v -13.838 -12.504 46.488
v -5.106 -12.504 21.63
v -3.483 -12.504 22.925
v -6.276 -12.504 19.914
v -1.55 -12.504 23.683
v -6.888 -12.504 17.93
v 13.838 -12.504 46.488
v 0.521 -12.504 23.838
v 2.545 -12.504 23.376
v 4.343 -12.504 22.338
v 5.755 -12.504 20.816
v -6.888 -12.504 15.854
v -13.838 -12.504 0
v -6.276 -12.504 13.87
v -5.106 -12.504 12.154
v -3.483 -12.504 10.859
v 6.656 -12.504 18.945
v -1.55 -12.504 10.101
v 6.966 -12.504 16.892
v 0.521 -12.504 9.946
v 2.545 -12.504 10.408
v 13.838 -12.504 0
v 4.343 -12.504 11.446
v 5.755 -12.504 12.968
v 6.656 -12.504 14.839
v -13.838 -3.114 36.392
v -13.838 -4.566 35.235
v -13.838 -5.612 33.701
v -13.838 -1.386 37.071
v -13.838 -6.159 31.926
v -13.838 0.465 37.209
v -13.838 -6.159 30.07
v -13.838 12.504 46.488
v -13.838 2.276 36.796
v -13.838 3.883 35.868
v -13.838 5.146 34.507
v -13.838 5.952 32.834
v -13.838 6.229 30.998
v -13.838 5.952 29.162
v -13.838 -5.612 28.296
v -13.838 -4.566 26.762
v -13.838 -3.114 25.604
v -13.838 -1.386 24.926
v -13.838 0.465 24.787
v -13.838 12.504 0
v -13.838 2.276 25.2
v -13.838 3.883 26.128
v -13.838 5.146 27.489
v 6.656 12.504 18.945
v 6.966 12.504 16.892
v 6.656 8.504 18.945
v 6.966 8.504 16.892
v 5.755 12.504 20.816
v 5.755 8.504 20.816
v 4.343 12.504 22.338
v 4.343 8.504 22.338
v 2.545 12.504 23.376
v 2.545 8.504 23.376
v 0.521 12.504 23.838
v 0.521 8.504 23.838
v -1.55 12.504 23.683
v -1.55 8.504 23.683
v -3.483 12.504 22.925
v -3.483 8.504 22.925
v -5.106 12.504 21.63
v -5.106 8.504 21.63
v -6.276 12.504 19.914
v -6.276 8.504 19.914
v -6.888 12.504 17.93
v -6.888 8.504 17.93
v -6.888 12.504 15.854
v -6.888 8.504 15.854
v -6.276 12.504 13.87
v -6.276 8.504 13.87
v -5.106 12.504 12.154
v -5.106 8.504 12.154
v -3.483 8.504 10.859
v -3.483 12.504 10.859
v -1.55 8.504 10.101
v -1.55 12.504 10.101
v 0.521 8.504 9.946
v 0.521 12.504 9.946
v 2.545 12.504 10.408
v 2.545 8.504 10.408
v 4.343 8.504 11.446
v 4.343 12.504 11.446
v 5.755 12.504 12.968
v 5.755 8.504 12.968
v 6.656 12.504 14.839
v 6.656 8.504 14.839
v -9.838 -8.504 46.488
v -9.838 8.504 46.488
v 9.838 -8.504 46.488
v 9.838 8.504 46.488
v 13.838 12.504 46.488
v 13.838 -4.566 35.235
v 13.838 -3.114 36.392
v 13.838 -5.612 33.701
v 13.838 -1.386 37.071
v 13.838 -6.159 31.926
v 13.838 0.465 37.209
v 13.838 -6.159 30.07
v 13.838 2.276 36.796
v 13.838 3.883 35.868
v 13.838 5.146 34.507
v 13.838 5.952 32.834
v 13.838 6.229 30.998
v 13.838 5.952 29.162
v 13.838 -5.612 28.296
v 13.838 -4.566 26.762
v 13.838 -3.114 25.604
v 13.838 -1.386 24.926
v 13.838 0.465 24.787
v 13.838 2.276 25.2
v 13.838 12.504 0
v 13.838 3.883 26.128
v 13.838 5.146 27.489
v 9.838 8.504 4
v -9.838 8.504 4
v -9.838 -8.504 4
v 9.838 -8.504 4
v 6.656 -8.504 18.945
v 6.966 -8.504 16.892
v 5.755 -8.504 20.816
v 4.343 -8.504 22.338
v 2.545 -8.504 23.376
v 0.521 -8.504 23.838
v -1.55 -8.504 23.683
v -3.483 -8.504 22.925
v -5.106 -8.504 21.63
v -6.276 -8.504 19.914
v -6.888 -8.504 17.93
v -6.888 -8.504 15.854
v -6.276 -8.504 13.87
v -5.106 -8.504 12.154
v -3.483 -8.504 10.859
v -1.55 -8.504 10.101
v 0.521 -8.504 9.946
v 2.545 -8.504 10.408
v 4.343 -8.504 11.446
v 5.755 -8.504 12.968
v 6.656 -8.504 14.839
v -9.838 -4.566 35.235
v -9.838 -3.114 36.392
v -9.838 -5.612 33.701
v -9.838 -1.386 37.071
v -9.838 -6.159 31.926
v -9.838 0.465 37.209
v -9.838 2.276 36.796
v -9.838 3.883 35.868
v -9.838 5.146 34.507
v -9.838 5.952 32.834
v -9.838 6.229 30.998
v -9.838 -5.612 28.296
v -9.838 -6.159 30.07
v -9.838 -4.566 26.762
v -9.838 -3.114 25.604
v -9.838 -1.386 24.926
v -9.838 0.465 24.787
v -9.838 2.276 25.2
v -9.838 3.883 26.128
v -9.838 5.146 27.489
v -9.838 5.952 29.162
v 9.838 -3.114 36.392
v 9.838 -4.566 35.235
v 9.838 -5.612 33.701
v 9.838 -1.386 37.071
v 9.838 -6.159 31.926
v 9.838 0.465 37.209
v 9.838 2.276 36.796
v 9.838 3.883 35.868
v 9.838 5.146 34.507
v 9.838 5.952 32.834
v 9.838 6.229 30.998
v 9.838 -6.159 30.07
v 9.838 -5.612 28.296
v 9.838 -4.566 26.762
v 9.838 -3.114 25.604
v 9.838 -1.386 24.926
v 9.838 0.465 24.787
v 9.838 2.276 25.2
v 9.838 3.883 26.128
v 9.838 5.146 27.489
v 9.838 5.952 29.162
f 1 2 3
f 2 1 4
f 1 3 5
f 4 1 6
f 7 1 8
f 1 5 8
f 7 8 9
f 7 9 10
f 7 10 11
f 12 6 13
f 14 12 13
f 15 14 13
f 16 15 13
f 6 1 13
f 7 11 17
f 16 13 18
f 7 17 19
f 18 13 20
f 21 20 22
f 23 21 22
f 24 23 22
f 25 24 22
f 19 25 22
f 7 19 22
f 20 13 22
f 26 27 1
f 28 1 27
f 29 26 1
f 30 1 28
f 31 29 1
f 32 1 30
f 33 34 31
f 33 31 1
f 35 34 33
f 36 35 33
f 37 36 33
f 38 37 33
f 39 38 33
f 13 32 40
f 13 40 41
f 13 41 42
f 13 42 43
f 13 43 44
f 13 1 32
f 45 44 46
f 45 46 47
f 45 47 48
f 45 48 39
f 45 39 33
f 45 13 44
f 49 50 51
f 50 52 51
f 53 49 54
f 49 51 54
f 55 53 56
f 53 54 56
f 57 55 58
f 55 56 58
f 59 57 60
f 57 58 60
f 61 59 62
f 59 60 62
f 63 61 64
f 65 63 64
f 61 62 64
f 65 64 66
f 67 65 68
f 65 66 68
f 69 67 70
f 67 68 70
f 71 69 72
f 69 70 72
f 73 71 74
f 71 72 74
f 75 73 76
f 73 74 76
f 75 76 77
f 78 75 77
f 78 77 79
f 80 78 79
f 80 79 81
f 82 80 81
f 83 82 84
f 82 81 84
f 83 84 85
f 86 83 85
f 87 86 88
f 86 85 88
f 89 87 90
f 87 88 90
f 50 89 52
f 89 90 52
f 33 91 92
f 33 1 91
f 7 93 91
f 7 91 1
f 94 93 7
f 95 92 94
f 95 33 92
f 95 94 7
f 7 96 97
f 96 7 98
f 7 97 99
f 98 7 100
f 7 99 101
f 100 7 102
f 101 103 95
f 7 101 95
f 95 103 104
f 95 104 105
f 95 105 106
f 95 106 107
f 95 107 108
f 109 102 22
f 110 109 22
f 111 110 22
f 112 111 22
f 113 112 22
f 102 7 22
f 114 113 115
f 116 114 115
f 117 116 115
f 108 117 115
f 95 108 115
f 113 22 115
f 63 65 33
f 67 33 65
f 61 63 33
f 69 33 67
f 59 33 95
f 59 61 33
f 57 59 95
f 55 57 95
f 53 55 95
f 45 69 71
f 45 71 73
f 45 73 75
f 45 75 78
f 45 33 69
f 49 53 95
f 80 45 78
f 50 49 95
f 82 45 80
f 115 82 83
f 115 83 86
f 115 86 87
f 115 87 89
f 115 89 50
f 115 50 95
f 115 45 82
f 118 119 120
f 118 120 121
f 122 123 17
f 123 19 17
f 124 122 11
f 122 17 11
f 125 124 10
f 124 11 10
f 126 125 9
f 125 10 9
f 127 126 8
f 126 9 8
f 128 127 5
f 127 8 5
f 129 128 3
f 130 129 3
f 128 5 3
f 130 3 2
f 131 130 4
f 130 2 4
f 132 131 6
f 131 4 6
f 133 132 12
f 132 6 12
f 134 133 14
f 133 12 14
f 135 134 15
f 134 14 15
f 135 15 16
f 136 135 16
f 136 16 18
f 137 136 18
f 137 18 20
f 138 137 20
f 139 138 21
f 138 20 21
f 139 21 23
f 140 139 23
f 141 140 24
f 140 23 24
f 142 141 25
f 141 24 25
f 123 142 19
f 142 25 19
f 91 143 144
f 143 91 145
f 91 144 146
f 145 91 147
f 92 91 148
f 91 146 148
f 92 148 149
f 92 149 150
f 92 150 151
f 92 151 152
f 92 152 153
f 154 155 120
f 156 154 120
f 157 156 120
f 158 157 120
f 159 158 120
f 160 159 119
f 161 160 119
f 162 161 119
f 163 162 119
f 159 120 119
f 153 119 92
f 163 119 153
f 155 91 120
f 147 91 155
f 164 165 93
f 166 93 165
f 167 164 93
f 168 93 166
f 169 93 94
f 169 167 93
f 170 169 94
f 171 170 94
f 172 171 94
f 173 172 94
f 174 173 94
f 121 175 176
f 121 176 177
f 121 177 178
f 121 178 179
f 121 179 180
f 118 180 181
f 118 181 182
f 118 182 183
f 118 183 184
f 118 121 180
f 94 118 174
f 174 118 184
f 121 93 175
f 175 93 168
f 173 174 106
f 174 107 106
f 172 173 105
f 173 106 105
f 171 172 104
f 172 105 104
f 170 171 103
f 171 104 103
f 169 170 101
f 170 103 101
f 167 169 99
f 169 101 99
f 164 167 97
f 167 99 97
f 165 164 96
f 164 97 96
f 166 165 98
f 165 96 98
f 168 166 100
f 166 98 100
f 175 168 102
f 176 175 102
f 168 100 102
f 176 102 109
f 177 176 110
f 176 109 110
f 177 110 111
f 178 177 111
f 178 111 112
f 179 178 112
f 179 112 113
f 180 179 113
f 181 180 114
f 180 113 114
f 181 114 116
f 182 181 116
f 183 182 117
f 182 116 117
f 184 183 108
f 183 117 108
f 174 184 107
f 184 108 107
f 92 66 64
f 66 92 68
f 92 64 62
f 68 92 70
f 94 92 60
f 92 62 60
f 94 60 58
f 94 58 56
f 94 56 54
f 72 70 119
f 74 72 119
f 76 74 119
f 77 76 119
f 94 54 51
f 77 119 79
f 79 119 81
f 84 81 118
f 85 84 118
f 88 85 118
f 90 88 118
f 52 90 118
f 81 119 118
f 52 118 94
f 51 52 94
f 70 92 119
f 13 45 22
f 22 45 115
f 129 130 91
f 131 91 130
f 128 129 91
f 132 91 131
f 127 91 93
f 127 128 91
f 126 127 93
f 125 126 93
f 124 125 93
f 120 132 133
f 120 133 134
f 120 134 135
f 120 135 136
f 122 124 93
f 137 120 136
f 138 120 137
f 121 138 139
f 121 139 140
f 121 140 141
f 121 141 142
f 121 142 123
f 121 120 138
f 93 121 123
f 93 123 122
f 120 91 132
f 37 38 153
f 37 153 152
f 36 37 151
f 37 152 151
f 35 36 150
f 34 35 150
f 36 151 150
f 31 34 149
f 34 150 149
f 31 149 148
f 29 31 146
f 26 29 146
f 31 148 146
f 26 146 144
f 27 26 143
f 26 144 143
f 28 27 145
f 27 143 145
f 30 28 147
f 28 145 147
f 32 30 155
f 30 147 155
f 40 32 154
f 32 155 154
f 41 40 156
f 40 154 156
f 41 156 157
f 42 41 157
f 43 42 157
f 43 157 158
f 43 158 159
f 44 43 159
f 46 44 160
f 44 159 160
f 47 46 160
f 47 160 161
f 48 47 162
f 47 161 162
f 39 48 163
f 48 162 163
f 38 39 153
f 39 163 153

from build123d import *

# Parameters (mm, degrees)
F0_W     = 27.675628
F0_H     = 25.008082
F1_DEPTH = 46.487905
F2_T     = -4
F3_R     = 6.965851
F4_DEPTH = 39.263487
F5_R     = 6.228625
F6_DEPTH = 30


with BuildPart() as f1:
    # F0 (on Top) → F1 (new body)
    with BuildSketch(Plane.XY):
        Rectangle(F0_W, F0_H)
    extrude(amount=F1_DEPTH)

    # F2
    f2_openings = [f1.faces().sort_by_distance(p)[0] for p in [
        (0, 0, 46.487905),
    ]]
    offset(amount=F2_T, openings=f2_openings)

    # F3 (on Front) → F4 (cut, symmetric)
    with BuildSketch(Plane.XZ):
        with Locations((0, 16.891949)):
            Circle(F3_R)
    extrude(amount=F4_DEPTH, both=True, mode=Mode.SUBTRACT)

    # F5 (on face) → F6 (cut, symmetric)
    with BuildSketch(Plane.YZ.offset(13.837814)):
        with Locations((0, 30.998062)):
            Circle(F5_R)
    extrude(amount=F6_DEPTH, both=True, mode=Mode.SUBTRACT)


solid = f1.part
